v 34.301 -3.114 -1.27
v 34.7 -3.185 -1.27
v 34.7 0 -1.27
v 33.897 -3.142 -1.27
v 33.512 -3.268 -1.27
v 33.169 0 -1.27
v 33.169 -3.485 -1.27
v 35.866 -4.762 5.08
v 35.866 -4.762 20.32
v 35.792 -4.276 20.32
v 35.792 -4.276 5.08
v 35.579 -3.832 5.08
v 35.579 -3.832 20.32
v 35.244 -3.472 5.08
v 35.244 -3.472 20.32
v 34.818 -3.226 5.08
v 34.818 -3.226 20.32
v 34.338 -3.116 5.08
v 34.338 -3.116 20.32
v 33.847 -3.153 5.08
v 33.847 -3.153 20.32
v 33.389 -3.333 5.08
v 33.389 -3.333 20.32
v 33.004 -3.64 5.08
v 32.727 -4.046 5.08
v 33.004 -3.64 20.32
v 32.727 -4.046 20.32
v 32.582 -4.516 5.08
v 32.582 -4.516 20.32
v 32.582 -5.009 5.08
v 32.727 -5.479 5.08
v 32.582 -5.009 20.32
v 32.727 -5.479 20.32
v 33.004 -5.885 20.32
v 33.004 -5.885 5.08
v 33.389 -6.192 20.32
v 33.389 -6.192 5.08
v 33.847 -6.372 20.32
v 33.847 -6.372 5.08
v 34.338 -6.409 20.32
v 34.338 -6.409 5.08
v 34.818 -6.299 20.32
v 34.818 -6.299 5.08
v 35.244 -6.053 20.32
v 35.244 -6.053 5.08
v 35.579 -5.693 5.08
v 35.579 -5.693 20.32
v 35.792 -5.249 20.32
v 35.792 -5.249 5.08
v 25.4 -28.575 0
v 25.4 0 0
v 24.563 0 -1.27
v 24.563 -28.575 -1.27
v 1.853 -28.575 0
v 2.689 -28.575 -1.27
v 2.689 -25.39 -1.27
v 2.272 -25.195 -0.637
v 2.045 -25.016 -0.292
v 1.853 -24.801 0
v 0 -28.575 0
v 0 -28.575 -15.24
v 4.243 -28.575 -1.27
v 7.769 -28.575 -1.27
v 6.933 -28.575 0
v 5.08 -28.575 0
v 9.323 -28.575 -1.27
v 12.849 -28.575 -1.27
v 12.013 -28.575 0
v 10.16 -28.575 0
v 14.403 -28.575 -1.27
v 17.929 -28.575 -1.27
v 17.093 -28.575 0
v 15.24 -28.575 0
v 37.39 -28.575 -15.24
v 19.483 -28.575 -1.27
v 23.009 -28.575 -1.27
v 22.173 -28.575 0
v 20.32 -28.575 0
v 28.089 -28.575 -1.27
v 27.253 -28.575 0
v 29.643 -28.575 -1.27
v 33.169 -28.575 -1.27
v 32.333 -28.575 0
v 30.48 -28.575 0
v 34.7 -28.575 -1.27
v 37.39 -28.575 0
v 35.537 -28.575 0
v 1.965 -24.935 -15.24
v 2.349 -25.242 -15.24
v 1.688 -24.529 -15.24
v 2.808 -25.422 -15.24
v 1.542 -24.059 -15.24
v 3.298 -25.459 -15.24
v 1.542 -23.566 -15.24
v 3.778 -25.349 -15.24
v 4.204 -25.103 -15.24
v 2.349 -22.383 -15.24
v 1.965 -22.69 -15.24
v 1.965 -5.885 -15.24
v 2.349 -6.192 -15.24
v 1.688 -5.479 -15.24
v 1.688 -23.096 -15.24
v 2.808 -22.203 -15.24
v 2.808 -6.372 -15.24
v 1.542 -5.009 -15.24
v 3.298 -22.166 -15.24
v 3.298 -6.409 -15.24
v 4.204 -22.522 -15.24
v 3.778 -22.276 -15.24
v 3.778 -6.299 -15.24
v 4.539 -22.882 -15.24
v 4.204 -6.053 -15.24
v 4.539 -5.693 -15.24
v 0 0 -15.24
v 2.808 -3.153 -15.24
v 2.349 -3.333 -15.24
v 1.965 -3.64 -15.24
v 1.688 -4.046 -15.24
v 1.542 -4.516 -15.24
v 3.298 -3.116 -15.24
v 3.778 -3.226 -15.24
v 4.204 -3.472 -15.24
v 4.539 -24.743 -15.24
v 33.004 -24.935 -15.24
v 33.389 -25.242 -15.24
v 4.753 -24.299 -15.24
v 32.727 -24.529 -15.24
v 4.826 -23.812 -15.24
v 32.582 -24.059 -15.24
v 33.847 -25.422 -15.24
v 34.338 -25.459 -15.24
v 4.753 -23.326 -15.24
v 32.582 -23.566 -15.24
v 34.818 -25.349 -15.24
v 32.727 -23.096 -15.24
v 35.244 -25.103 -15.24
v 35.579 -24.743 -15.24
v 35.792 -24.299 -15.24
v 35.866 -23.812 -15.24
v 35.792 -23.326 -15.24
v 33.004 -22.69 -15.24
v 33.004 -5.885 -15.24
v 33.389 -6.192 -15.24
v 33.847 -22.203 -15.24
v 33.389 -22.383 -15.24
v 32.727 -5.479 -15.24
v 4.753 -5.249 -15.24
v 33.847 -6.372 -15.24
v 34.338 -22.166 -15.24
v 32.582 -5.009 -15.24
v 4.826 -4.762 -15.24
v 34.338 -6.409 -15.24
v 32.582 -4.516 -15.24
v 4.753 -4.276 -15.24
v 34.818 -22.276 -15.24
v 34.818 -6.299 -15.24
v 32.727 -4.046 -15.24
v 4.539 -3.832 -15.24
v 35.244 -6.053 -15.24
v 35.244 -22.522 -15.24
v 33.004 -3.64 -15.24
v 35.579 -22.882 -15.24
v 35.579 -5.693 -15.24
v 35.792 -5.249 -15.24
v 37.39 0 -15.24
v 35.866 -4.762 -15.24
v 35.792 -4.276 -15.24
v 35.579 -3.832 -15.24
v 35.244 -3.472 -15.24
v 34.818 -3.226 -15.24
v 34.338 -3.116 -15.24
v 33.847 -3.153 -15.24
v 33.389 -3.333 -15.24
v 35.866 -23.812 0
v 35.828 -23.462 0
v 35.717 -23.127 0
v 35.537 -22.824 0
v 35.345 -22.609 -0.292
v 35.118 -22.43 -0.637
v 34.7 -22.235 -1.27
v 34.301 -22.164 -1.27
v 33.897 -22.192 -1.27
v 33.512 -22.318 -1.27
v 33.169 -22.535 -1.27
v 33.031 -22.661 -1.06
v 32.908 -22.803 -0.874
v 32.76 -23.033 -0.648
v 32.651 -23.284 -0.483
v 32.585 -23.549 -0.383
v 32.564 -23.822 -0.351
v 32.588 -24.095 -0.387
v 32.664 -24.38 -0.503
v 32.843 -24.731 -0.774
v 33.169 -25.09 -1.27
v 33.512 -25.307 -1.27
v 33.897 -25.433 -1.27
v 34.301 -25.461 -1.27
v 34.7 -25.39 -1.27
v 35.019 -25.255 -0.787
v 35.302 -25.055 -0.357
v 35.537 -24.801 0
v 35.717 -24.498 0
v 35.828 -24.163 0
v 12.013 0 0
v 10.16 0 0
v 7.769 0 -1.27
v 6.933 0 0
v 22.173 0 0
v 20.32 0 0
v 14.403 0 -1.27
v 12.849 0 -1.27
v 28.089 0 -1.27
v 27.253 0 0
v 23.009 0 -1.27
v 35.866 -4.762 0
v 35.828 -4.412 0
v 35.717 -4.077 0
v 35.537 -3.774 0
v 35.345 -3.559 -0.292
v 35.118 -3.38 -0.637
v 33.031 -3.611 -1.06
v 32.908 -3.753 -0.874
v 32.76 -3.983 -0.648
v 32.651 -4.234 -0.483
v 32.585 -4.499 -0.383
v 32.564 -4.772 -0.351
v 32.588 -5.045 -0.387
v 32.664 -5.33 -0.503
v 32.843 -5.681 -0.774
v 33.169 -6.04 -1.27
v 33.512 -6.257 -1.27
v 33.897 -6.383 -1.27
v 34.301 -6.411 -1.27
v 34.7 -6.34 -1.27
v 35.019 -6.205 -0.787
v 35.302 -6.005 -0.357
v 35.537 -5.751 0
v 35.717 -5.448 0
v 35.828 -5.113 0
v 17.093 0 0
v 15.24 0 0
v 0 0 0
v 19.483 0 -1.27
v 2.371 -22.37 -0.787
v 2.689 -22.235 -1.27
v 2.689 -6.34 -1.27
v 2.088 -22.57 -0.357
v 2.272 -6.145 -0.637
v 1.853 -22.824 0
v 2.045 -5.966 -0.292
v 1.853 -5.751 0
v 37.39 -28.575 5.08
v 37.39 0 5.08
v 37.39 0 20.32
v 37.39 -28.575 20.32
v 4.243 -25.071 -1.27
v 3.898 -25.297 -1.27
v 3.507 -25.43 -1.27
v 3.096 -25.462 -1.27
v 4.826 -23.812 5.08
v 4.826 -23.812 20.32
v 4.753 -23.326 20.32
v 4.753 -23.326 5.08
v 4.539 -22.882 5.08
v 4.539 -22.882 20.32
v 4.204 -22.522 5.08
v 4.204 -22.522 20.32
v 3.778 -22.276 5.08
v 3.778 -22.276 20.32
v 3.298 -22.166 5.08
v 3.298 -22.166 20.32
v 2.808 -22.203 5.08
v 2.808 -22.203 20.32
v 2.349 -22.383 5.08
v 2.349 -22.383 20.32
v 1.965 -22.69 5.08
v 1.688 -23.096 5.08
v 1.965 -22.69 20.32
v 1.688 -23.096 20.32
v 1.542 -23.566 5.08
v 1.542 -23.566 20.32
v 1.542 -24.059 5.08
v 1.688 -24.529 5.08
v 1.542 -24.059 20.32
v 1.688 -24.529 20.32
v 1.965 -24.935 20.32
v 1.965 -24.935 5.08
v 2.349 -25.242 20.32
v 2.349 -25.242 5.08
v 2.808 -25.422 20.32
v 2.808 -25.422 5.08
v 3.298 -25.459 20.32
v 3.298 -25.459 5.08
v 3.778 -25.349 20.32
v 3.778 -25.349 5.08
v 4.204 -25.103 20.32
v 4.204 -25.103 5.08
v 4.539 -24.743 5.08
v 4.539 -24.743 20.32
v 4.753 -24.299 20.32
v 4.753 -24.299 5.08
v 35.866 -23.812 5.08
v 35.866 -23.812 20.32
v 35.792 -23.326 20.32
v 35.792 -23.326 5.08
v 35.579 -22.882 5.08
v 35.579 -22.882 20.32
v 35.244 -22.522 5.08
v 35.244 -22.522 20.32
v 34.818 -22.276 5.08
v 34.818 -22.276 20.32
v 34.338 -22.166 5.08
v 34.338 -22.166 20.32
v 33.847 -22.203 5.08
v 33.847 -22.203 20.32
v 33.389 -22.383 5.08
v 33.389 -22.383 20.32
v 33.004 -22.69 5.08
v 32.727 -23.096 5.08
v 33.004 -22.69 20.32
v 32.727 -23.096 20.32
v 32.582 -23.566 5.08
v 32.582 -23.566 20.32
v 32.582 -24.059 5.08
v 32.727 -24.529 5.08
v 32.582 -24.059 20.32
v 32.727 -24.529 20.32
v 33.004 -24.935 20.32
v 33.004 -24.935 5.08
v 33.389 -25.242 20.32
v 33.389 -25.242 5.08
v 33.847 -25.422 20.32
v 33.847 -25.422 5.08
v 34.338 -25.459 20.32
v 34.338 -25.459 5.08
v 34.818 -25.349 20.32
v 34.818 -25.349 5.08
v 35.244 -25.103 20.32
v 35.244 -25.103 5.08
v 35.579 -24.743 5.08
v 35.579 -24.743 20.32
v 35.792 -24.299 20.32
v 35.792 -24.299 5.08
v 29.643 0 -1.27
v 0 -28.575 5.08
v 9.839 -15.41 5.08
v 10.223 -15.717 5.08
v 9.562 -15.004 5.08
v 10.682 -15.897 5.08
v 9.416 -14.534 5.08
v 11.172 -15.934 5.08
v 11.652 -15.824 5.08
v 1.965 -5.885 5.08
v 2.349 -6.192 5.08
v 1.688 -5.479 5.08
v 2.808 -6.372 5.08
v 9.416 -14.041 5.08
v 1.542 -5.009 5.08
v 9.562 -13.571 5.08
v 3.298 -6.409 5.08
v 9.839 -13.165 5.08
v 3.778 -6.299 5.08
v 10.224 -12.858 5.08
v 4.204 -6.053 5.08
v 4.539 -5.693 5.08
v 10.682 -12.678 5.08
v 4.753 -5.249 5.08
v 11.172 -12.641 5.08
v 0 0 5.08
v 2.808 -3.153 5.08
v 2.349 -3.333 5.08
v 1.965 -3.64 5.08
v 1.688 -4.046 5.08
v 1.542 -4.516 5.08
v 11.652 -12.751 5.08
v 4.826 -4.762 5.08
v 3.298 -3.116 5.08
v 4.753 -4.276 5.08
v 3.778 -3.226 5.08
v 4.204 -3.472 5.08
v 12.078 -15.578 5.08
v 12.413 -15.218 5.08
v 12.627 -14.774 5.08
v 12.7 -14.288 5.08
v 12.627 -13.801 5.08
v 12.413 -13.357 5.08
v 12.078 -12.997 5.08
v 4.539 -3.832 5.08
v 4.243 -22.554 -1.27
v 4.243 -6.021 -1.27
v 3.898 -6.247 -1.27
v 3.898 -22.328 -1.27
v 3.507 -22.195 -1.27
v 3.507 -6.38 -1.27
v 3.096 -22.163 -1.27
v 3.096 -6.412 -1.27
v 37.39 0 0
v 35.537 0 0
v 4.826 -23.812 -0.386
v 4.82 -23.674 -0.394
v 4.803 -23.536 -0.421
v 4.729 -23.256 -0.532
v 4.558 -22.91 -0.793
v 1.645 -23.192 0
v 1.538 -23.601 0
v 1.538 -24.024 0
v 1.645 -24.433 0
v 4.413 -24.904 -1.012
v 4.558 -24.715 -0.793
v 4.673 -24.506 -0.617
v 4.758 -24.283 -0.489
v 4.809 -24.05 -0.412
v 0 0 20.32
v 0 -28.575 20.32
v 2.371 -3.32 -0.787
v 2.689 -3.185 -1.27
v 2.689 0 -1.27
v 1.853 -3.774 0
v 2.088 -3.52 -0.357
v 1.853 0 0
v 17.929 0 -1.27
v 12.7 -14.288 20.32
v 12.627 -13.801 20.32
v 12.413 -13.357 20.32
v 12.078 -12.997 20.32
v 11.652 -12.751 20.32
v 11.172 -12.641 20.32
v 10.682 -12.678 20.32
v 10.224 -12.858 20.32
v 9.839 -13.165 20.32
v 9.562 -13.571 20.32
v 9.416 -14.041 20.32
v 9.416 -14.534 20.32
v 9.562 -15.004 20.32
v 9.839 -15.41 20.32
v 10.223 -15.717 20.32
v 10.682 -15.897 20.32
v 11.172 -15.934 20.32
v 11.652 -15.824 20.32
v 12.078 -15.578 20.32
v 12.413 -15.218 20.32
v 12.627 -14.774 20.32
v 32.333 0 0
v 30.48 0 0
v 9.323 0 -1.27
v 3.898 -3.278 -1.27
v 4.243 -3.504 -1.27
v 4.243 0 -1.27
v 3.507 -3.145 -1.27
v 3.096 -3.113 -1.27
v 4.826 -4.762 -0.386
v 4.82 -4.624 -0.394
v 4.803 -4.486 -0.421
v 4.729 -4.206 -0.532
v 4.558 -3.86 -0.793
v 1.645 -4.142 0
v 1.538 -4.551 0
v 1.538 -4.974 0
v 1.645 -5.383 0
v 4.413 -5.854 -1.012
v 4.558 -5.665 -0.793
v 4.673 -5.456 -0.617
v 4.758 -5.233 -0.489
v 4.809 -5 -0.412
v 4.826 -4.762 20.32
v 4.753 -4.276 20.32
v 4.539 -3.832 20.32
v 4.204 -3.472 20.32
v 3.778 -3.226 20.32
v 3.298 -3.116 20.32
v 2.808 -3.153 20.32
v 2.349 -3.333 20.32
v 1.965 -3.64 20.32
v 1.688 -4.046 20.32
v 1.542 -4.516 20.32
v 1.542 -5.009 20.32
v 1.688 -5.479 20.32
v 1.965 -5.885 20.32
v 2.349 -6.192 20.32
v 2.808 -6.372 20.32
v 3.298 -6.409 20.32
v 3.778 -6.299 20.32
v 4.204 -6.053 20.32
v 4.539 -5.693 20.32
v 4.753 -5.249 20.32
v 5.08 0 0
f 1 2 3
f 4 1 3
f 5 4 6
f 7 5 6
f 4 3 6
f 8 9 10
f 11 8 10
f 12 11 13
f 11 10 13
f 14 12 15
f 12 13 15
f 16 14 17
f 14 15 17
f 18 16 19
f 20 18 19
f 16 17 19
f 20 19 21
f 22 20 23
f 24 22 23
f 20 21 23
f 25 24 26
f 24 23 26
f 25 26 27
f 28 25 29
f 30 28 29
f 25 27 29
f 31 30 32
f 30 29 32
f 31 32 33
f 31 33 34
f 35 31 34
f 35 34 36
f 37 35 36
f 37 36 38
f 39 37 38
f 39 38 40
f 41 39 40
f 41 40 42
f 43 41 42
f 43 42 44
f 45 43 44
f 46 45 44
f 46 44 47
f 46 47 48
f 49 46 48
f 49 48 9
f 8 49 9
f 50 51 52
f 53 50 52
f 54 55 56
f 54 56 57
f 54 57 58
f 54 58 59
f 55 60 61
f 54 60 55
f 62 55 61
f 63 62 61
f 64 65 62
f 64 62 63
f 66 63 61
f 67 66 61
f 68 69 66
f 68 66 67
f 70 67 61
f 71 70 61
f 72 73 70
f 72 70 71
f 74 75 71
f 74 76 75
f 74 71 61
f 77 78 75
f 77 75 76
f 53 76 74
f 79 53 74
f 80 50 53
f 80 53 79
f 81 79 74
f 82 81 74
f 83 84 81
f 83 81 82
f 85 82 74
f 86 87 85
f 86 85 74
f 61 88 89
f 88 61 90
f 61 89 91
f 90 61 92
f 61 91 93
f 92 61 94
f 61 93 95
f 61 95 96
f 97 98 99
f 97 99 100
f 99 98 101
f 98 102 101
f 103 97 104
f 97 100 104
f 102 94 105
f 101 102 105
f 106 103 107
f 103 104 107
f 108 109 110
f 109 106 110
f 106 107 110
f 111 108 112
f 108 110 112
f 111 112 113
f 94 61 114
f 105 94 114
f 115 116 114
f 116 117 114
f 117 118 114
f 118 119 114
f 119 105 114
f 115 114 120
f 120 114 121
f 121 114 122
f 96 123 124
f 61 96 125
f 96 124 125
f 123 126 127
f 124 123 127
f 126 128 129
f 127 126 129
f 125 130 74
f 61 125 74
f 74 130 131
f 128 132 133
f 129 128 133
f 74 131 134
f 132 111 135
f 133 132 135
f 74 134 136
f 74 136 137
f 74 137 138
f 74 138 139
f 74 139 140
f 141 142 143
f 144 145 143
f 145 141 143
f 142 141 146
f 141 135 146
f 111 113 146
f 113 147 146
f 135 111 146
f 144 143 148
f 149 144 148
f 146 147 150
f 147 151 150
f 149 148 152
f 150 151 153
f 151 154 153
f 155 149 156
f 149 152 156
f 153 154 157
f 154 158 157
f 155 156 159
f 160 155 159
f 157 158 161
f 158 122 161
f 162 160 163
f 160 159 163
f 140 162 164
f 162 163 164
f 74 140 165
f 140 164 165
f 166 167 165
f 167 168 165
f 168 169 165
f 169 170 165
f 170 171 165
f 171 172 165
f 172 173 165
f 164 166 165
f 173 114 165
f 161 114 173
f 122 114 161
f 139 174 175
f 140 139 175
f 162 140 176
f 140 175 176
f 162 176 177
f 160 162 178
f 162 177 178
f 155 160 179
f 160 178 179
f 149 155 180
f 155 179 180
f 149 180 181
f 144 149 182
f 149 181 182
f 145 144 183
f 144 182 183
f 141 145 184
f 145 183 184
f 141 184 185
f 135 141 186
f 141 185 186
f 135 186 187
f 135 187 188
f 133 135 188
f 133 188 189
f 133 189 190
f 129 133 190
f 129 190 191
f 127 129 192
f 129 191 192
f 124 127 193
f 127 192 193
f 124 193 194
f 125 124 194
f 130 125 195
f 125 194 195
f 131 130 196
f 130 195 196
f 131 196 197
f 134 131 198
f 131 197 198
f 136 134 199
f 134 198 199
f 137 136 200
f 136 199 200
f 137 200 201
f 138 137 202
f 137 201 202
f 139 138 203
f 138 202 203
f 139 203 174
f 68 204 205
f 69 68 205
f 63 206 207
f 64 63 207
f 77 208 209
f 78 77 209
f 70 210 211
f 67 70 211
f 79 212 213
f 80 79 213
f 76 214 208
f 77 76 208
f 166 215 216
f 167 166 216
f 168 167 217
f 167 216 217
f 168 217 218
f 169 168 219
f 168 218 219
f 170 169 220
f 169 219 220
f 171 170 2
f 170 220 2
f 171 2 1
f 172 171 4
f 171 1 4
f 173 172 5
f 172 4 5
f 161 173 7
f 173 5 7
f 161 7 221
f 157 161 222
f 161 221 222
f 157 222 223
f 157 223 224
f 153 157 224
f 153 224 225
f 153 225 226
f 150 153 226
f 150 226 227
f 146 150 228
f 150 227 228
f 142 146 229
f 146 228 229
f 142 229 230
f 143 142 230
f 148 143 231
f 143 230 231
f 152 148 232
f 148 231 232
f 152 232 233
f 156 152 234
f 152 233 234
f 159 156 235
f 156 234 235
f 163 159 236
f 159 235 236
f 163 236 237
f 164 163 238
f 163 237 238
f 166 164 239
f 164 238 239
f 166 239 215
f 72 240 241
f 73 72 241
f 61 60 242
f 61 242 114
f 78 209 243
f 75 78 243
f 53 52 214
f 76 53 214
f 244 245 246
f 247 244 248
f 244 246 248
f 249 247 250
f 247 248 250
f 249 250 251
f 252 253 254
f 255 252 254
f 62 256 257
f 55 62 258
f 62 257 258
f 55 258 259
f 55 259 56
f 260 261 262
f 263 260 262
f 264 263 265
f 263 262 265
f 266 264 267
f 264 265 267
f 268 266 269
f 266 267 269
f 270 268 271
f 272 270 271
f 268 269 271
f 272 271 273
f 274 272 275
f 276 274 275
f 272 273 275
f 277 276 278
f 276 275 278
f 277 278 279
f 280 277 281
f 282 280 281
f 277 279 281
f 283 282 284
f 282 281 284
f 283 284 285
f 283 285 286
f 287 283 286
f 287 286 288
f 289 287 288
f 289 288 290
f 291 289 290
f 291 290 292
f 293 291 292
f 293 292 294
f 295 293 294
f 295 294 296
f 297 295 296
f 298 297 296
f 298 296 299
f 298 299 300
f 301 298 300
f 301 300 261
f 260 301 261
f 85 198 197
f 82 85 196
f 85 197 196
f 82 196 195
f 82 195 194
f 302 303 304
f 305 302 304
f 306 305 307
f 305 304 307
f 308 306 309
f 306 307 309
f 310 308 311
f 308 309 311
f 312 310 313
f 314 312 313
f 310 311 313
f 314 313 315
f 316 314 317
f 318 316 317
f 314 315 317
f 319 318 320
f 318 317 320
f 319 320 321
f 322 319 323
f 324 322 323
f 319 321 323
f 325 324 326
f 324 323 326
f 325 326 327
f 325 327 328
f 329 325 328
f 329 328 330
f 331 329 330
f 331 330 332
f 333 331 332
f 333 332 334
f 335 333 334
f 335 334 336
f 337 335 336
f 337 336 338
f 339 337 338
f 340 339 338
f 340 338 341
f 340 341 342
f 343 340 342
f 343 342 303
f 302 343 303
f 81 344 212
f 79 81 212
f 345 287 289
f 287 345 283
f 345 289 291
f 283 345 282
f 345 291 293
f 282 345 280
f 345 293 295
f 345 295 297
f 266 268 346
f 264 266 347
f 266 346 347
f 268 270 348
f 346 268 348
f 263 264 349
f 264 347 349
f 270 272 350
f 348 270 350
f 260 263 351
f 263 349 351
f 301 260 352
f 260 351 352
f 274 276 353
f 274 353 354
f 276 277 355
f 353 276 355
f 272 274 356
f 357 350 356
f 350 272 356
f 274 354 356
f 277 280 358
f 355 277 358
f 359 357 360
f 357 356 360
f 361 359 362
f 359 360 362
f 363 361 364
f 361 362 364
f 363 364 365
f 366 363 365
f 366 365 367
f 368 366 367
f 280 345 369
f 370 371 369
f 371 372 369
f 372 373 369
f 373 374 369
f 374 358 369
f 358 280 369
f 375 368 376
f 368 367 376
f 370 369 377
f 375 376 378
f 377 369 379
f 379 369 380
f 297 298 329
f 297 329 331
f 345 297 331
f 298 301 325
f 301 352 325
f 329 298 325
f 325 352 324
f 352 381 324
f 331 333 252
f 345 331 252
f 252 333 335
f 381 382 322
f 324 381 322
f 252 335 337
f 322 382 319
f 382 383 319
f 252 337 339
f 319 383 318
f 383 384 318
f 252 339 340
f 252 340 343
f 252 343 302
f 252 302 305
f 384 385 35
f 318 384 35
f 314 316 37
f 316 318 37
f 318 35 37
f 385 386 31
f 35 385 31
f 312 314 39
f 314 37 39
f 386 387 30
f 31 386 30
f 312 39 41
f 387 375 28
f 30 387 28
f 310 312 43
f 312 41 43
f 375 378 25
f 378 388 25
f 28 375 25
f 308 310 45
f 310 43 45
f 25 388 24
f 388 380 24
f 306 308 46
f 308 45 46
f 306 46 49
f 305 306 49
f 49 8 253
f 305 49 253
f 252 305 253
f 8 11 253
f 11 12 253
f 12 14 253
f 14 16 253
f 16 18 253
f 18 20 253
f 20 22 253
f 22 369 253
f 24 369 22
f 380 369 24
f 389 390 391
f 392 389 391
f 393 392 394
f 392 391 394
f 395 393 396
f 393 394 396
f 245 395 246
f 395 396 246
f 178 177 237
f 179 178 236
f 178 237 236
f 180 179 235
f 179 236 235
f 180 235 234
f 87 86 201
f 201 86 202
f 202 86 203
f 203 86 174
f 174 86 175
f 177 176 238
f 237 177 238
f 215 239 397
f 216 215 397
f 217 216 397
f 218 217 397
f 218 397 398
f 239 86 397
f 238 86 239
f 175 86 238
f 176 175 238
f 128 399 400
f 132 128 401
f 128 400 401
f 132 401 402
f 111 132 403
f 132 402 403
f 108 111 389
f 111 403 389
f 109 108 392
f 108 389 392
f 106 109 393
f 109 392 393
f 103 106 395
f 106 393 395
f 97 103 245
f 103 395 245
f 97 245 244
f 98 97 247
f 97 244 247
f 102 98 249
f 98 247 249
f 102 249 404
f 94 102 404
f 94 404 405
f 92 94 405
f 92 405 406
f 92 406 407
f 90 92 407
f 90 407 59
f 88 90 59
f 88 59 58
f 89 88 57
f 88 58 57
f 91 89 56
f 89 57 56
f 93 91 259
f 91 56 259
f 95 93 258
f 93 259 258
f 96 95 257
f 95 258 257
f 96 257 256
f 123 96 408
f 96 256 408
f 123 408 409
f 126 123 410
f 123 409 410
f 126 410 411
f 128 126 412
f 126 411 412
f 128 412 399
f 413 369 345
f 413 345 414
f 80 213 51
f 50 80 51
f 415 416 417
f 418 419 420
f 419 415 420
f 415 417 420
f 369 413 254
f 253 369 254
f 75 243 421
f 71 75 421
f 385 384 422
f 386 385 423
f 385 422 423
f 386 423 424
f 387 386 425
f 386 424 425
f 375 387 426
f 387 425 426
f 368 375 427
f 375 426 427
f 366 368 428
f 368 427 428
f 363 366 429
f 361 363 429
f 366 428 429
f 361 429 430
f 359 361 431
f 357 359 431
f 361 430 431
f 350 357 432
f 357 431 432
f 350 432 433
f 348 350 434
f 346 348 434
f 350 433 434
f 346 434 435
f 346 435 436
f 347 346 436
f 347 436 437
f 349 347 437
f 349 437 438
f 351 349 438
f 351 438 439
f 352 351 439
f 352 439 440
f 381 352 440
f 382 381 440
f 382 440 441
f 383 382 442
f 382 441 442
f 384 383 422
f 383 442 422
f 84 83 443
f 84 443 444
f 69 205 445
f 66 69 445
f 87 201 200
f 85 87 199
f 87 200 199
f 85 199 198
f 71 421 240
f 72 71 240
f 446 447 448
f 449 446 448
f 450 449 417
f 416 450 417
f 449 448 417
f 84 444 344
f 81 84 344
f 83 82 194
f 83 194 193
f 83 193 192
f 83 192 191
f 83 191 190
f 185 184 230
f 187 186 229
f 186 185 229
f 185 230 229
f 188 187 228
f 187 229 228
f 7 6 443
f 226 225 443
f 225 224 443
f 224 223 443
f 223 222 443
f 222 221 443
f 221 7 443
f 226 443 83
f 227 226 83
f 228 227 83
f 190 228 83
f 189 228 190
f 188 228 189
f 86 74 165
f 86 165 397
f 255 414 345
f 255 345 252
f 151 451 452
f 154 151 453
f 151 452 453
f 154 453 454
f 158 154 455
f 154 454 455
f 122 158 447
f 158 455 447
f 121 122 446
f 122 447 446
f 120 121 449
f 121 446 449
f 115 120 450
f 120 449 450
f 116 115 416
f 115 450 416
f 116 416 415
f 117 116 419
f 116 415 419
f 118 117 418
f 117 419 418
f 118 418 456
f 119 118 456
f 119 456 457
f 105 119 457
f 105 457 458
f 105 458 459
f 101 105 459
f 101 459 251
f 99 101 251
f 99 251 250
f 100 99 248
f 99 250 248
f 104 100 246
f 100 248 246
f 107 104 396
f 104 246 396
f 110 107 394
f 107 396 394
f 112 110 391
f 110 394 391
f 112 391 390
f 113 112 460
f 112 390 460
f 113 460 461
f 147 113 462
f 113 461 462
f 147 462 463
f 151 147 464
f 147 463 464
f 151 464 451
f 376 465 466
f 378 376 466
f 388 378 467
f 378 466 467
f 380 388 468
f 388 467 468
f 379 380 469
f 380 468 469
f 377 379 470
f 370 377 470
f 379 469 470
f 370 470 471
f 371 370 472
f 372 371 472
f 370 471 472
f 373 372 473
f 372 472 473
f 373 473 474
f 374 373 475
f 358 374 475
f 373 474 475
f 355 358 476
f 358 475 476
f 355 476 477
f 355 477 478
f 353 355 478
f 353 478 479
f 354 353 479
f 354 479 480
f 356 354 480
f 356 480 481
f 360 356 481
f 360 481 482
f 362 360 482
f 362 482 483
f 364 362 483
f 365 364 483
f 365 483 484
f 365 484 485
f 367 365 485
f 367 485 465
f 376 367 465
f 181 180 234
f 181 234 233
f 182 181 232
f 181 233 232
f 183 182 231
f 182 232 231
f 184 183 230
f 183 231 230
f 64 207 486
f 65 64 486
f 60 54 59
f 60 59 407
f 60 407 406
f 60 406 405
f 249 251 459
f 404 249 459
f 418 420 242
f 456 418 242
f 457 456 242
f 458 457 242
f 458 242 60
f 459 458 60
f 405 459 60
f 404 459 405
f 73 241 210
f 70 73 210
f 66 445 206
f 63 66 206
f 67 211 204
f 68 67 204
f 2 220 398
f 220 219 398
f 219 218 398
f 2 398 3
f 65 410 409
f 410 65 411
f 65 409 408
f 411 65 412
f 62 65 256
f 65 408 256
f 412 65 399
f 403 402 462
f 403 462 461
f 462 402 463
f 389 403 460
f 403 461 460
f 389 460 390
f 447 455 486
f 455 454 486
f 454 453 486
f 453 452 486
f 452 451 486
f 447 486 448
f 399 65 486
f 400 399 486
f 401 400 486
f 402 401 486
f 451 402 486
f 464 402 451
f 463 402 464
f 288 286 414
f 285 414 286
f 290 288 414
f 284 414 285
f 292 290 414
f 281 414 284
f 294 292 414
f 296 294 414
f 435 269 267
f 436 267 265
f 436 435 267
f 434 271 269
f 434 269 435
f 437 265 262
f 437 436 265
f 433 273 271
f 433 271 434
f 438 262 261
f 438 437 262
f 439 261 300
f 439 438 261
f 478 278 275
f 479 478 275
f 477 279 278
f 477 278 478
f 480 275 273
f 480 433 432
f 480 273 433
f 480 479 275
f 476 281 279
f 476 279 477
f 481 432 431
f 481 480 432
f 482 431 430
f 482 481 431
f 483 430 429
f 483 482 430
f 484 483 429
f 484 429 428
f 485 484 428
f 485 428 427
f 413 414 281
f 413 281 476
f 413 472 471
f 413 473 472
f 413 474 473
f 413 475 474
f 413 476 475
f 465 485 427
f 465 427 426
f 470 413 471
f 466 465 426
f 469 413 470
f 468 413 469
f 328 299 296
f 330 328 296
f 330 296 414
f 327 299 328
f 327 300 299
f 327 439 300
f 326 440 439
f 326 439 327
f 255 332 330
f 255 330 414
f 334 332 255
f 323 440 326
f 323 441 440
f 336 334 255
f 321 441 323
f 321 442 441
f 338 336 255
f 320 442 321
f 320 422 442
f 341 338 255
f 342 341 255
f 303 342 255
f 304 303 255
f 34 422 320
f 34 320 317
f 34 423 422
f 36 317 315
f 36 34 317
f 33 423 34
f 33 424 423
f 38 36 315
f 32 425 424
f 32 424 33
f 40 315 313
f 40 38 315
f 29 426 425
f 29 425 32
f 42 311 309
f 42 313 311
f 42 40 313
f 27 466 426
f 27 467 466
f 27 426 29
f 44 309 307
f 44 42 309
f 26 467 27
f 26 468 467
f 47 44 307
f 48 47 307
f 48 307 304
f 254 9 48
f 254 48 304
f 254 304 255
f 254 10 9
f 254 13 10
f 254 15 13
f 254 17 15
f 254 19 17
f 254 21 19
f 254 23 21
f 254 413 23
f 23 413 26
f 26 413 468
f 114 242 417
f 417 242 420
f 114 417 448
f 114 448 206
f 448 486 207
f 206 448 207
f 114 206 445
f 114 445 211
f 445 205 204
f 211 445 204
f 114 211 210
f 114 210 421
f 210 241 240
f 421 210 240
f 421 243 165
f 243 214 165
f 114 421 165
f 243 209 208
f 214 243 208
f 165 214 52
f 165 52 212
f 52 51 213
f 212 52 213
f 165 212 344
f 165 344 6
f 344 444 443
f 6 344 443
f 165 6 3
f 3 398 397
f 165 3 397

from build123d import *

# Parameters (mm, degrees)
F0_W     = 37.389658
F0_H     = 15.24
F1_DEPTH = 28.575
F2_R     = 1.651
F3_DEPTH = 35.561
F4_R     = 1.651
F5_DEPTH = 15.24


with BuildPart() as f1:
    # F0 (on Front) → F1 (new body)
    with BuildSketch(Plane.XZ):
        with Locations((18.694829, 12.7)):
            Rectangle(F0_W, F0_H)
        Polygon((2.689407, -1.27), (1.852701, 0), (0, 0), (0, -15.24), (37.389658, -15.24), (37.389658, 0), (35.536956, 0), (34.70025, -1.27), (33.169399, -1.27), (32.332693, 0), (30.479987, 0), (29.643282, -1.27), (28.089399, -1.27), (27.252693, 0), (25.399987, 0), (24.563282, -1.27), (23.009399, -1.27), (22.172693, 0), (20.319992, 0), (19.483286, -1.27), (17.929403, -1.27), (17.092697, 0), (15.239992, 0), (14.403286, -1.27), (12.849403, -1.27), (12.012697, 0), (10.159996, 0), (9.32329, -1.27), (7.769407, -1.27), (6.932701, 0), (5.079996, 0), (4.24329, -1.27), align=None)
    extrude(amount=F1_DEPTH)

    # F2 (on face) → F3 (cut, through all)
    with BuildSketch(Plane.XY.offset(20.32)):
        with Locations((3.175, -4.7625)):
            Circle(F2_R)
        with Locations((3.175, -23.8125)):
            Circle(F2_R)
        with Locations((34.214658, -4.7625)):
            Circle(F2_R)
        with Locations((34.214658, -23.8125)):
            Circle(F2_R)
    extrude(amount=-F3_DEPTH, mode=Mode.SUBTRACT)

    # F4 (on face) → F5 (cut, through all)
    with BuildSketch(Plane.XY.offset(20.32)):
        with Locations((11.049, -14.2875)):
            Circle(F4_R)
    extrude(amount=-F5_DEPTH, mode=Mode.SUBTRACT)


solid = f1.part
